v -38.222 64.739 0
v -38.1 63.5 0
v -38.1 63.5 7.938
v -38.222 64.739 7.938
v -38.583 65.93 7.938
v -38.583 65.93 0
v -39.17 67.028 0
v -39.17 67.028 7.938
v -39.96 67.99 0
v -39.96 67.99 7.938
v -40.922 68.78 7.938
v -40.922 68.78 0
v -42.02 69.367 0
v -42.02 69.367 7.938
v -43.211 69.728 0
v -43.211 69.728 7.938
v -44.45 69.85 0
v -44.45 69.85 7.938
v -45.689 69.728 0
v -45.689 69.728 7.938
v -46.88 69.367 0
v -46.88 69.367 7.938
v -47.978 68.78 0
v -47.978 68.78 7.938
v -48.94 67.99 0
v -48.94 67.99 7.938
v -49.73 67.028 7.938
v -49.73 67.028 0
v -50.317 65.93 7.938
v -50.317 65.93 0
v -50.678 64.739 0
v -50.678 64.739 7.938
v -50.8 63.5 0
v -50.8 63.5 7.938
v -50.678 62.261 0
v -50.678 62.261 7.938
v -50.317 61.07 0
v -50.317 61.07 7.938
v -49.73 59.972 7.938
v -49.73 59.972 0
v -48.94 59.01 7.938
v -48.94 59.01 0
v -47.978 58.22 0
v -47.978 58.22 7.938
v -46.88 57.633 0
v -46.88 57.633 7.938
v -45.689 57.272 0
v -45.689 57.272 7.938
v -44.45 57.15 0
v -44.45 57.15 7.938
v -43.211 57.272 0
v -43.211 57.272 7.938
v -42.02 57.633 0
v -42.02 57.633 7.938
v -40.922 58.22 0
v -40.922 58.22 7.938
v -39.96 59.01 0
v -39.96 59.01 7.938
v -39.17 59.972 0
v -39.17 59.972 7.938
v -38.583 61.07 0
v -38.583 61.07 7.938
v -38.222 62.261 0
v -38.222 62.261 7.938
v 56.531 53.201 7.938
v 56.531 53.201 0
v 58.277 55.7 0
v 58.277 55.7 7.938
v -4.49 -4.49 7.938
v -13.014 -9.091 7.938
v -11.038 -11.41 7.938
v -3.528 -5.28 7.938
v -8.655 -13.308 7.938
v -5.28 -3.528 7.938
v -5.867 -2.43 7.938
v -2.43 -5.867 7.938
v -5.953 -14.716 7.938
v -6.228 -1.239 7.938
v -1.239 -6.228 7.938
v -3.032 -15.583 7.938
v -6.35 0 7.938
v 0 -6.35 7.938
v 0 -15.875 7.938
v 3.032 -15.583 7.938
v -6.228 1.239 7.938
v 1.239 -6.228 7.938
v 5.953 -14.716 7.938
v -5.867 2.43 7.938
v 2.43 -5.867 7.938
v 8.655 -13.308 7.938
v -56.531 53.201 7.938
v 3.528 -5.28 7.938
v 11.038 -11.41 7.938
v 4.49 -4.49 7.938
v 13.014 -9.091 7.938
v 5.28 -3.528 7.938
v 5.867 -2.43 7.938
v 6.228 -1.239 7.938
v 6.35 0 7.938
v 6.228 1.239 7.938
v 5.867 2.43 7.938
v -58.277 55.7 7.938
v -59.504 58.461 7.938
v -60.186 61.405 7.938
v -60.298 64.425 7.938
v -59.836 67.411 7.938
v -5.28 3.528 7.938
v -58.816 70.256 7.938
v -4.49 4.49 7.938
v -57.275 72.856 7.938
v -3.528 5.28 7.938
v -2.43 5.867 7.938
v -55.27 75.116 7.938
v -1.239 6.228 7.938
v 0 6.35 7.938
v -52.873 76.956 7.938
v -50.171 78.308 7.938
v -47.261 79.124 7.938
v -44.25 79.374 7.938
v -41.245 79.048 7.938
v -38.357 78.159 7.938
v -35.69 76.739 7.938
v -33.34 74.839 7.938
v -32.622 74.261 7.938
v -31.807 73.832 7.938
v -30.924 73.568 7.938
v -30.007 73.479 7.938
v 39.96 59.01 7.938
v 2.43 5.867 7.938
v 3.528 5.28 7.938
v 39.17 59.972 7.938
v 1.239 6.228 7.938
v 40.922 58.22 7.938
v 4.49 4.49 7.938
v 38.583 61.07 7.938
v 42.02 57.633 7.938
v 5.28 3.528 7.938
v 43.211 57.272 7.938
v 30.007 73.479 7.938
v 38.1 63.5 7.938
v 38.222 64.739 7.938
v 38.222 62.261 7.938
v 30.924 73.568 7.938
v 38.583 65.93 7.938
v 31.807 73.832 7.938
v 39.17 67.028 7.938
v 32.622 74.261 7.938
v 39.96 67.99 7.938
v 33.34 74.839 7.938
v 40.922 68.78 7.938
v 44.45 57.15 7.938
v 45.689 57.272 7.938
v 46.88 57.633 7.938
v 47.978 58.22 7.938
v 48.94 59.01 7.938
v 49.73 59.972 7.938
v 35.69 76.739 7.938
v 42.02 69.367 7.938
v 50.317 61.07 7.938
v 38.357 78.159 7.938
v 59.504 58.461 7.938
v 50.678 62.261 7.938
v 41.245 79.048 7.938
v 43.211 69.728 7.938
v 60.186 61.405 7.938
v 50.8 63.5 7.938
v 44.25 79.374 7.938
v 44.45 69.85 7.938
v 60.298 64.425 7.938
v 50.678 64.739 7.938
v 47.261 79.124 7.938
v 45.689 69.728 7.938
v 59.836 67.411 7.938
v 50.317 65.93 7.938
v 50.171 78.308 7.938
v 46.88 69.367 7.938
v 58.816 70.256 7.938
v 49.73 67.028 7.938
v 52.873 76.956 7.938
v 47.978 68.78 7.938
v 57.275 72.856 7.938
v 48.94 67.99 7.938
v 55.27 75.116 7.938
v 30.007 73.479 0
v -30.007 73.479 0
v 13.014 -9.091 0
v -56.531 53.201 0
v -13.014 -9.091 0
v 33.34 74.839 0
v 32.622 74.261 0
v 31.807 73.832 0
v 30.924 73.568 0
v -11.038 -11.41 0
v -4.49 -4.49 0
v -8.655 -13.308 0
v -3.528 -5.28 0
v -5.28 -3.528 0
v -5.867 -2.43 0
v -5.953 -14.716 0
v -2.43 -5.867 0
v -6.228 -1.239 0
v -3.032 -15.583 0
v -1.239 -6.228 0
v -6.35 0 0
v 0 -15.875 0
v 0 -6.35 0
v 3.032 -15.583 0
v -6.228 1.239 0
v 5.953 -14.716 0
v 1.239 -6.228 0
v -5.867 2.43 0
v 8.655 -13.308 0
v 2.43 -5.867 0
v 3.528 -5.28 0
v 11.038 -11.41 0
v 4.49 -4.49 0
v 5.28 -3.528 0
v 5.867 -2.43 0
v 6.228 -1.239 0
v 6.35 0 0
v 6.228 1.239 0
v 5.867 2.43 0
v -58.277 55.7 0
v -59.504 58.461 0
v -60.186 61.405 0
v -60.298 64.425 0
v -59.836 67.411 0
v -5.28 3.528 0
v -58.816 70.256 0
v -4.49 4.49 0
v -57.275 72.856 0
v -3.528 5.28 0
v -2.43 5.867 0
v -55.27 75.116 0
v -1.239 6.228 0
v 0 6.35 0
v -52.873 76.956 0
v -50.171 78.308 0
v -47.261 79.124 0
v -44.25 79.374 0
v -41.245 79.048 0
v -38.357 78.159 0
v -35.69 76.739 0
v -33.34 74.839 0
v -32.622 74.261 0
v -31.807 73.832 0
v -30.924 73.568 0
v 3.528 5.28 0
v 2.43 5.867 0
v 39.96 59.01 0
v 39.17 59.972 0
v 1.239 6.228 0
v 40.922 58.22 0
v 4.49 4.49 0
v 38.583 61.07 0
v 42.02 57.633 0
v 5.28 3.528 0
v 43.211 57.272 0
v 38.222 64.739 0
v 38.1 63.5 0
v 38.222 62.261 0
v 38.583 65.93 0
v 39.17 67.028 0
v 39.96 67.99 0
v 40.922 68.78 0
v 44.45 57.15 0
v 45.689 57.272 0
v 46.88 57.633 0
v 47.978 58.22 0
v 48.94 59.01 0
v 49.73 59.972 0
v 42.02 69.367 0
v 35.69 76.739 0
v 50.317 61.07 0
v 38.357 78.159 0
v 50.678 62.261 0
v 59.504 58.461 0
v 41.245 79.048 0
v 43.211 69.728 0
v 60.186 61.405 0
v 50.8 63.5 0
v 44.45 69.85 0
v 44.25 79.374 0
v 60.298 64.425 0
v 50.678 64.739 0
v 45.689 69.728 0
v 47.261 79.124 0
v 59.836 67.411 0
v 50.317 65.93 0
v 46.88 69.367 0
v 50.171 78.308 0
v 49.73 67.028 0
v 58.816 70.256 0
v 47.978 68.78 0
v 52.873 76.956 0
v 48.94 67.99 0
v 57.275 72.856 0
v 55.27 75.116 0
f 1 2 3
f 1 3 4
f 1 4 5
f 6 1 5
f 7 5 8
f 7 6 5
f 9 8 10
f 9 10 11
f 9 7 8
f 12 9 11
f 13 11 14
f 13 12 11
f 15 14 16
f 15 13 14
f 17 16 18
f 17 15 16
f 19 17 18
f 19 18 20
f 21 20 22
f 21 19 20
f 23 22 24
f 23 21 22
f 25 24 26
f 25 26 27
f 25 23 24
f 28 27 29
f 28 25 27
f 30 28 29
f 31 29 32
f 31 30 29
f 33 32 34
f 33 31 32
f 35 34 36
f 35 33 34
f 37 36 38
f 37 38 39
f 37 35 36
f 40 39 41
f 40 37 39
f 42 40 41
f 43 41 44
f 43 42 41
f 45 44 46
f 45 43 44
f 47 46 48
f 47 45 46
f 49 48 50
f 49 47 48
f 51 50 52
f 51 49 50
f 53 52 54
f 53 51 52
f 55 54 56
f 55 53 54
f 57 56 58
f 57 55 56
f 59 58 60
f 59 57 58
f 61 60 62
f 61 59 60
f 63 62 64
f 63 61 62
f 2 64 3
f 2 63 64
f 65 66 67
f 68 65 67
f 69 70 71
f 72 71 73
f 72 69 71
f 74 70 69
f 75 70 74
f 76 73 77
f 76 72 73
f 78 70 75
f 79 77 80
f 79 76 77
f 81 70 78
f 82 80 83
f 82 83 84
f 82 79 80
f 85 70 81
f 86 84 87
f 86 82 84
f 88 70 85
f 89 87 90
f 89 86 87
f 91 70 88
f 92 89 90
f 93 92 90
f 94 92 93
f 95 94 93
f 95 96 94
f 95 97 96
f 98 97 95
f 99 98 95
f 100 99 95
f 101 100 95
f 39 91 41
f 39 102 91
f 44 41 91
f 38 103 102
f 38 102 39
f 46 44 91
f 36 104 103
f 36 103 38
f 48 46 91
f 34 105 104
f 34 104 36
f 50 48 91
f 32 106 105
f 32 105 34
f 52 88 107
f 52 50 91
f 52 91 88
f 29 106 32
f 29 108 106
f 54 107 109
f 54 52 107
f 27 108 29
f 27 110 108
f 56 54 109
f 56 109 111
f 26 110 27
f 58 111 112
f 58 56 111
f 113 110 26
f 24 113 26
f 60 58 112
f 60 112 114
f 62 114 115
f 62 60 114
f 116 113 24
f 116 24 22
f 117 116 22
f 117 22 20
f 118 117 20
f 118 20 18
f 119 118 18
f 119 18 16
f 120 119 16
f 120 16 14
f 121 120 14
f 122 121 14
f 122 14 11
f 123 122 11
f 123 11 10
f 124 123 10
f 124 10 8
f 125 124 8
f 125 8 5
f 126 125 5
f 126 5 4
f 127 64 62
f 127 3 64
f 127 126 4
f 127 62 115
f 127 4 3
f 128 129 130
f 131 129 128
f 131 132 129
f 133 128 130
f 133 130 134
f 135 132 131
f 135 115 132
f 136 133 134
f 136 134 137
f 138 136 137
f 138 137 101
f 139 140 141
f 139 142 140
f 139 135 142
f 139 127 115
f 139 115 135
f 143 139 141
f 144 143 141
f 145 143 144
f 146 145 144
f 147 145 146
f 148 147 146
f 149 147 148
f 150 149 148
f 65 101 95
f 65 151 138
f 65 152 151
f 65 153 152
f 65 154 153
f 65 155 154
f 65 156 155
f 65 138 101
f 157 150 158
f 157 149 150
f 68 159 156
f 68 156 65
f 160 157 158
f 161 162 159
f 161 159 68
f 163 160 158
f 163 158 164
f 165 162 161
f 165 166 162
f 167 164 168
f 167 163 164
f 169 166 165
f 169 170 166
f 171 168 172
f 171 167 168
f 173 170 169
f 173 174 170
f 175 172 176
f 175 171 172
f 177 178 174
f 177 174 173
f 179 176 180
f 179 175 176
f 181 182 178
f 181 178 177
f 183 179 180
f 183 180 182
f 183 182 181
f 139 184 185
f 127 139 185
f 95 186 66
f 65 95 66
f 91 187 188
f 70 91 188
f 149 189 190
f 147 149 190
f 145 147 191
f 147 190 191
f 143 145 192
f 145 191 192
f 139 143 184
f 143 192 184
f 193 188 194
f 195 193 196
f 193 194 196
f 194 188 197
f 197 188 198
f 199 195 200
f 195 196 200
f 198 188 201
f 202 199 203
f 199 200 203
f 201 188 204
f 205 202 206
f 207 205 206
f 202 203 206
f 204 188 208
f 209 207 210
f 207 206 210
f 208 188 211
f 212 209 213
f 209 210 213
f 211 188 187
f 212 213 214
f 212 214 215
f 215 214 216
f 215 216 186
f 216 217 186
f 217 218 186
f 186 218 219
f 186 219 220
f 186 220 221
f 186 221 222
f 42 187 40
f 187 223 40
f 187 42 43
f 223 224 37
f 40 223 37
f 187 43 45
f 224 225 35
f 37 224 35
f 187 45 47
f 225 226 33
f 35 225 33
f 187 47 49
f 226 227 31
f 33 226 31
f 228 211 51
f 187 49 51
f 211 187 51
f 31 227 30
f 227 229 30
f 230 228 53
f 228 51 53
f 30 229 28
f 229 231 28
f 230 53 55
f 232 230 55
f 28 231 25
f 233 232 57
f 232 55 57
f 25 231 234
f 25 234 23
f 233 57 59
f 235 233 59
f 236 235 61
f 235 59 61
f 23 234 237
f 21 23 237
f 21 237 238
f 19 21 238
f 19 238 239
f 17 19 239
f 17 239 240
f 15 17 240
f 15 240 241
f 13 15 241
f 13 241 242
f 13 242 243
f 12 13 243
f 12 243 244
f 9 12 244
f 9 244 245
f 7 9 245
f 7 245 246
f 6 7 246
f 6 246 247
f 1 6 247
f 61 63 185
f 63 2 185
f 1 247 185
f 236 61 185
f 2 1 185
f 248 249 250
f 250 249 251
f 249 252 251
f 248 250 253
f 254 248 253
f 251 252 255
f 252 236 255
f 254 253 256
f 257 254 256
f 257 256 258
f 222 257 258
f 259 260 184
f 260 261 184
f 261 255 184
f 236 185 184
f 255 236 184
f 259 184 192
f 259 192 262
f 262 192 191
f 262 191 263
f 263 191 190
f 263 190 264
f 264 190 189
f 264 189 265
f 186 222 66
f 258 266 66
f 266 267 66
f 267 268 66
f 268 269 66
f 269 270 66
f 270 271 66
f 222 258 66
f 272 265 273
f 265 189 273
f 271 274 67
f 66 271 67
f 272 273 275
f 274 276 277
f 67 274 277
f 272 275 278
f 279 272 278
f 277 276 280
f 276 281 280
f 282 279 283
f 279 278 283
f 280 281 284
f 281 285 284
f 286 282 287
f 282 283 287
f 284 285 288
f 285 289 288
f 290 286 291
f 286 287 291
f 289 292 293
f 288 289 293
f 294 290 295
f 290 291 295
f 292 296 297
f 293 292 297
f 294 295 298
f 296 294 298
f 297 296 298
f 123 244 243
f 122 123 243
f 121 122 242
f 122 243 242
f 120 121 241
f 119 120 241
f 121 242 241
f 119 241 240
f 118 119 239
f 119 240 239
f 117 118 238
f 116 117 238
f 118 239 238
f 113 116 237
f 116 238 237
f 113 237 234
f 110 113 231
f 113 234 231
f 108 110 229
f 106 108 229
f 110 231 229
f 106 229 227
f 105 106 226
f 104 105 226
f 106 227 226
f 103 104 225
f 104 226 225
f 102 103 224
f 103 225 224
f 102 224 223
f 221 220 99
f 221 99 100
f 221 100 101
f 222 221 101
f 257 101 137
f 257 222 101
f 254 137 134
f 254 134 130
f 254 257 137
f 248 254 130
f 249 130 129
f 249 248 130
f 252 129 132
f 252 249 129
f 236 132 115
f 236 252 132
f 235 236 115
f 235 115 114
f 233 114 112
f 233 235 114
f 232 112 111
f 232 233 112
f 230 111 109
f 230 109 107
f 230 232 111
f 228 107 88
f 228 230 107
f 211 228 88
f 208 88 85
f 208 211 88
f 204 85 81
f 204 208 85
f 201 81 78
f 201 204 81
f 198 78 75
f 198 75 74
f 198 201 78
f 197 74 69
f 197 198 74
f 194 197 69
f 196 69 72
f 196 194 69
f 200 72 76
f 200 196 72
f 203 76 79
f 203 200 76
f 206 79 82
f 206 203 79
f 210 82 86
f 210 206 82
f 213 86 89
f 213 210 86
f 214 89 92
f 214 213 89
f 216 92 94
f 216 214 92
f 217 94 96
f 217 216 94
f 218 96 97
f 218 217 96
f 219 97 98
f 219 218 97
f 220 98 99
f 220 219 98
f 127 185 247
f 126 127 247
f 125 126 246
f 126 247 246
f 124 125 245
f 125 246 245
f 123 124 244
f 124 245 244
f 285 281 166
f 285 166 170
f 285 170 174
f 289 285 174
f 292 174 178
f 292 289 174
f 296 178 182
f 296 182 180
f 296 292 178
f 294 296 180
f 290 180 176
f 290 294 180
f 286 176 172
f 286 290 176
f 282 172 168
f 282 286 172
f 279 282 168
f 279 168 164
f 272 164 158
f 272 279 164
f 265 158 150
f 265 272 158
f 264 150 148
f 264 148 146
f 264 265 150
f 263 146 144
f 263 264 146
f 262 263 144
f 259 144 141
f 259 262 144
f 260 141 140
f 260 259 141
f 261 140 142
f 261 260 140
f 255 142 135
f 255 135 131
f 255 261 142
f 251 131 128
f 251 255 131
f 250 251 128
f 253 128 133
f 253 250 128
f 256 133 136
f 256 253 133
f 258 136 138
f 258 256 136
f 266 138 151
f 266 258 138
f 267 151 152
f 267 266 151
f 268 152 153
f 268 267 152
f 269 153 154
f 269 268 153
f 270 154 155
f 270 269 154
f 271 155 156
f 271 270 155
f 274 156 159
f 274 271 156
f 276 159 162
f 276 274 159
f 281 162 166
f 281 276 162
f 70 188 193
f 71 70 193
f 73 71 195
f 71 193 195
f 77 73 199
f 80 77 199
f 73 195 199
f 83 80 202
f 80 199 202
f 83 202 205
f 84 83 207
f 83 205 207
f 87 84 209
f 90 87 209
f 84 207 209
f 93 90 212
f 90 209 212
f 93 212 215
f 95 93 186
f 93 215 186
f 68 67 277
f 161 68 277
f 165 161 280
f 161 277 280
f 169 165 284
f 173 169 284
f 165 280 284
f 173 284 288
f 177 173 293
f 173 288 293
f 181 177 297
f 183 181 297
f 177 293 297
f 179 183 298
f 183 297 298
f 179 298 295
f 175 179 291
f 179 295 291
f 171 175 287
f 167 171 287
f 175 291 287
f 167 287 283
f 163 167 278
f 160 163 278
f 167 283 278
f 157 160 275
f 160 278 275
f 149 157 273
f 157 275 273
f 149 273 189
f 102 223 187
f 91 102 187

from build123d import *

# Parameters (mm, degrees)
F0_R     = 6.35
F1_DEPTH = 7.9375


with BuildPart() as f1:
    # F0 (on Top) → F1 (new body)
    with BuildSketch(Plane.XY):
        with BuildLine():
            Line((-56.530945, 53.201145), (-13.013914, -9.091406))
            ThreePointArc((-13.013914, -9.091406), (0, -15.875), (13.013914, -9.091406))
            Line((13.013914, -9.091406), (56.530945, 53.201145))
            Line((56.530945, 53.201145), (58.276649, 55.700037))
            ThreePointArc((58.276649, 55.700037), (54.115532, 76.093376), (33.339815, 74.839286))
            ThreePointArc((33.339815, 74.839286), (31.806815, 73.831853), (30.006759, 73.478571))
            Line((30.006759, 73.478571), (-30.006759, 73.478571))
            ThreePointArc((-30.006759, 73.478571), (-31.806815, 73.831853), (-33.339815, 74.839286))
            ThreePointArc((-33.339815, 74.839286), (-54.115532, 76.093376), (-58.276649, 55.700037))
            Line((-58.276649, 55.700037), (-56.530945, 53.201145))
        make_face()
        Circle(F0_R, mode=Mode.SUBTRACT)
        with Locations((-44.45, 63.5)):
            Circle(F0_R, mode=Mode.SUBTRACT)
        with Locations((44.45, 63.5)):
            Circle(F0_R, mode=Mode.SUBTRACT)
    extrude(amount=F1_DEPTH)


solid = f1.part
